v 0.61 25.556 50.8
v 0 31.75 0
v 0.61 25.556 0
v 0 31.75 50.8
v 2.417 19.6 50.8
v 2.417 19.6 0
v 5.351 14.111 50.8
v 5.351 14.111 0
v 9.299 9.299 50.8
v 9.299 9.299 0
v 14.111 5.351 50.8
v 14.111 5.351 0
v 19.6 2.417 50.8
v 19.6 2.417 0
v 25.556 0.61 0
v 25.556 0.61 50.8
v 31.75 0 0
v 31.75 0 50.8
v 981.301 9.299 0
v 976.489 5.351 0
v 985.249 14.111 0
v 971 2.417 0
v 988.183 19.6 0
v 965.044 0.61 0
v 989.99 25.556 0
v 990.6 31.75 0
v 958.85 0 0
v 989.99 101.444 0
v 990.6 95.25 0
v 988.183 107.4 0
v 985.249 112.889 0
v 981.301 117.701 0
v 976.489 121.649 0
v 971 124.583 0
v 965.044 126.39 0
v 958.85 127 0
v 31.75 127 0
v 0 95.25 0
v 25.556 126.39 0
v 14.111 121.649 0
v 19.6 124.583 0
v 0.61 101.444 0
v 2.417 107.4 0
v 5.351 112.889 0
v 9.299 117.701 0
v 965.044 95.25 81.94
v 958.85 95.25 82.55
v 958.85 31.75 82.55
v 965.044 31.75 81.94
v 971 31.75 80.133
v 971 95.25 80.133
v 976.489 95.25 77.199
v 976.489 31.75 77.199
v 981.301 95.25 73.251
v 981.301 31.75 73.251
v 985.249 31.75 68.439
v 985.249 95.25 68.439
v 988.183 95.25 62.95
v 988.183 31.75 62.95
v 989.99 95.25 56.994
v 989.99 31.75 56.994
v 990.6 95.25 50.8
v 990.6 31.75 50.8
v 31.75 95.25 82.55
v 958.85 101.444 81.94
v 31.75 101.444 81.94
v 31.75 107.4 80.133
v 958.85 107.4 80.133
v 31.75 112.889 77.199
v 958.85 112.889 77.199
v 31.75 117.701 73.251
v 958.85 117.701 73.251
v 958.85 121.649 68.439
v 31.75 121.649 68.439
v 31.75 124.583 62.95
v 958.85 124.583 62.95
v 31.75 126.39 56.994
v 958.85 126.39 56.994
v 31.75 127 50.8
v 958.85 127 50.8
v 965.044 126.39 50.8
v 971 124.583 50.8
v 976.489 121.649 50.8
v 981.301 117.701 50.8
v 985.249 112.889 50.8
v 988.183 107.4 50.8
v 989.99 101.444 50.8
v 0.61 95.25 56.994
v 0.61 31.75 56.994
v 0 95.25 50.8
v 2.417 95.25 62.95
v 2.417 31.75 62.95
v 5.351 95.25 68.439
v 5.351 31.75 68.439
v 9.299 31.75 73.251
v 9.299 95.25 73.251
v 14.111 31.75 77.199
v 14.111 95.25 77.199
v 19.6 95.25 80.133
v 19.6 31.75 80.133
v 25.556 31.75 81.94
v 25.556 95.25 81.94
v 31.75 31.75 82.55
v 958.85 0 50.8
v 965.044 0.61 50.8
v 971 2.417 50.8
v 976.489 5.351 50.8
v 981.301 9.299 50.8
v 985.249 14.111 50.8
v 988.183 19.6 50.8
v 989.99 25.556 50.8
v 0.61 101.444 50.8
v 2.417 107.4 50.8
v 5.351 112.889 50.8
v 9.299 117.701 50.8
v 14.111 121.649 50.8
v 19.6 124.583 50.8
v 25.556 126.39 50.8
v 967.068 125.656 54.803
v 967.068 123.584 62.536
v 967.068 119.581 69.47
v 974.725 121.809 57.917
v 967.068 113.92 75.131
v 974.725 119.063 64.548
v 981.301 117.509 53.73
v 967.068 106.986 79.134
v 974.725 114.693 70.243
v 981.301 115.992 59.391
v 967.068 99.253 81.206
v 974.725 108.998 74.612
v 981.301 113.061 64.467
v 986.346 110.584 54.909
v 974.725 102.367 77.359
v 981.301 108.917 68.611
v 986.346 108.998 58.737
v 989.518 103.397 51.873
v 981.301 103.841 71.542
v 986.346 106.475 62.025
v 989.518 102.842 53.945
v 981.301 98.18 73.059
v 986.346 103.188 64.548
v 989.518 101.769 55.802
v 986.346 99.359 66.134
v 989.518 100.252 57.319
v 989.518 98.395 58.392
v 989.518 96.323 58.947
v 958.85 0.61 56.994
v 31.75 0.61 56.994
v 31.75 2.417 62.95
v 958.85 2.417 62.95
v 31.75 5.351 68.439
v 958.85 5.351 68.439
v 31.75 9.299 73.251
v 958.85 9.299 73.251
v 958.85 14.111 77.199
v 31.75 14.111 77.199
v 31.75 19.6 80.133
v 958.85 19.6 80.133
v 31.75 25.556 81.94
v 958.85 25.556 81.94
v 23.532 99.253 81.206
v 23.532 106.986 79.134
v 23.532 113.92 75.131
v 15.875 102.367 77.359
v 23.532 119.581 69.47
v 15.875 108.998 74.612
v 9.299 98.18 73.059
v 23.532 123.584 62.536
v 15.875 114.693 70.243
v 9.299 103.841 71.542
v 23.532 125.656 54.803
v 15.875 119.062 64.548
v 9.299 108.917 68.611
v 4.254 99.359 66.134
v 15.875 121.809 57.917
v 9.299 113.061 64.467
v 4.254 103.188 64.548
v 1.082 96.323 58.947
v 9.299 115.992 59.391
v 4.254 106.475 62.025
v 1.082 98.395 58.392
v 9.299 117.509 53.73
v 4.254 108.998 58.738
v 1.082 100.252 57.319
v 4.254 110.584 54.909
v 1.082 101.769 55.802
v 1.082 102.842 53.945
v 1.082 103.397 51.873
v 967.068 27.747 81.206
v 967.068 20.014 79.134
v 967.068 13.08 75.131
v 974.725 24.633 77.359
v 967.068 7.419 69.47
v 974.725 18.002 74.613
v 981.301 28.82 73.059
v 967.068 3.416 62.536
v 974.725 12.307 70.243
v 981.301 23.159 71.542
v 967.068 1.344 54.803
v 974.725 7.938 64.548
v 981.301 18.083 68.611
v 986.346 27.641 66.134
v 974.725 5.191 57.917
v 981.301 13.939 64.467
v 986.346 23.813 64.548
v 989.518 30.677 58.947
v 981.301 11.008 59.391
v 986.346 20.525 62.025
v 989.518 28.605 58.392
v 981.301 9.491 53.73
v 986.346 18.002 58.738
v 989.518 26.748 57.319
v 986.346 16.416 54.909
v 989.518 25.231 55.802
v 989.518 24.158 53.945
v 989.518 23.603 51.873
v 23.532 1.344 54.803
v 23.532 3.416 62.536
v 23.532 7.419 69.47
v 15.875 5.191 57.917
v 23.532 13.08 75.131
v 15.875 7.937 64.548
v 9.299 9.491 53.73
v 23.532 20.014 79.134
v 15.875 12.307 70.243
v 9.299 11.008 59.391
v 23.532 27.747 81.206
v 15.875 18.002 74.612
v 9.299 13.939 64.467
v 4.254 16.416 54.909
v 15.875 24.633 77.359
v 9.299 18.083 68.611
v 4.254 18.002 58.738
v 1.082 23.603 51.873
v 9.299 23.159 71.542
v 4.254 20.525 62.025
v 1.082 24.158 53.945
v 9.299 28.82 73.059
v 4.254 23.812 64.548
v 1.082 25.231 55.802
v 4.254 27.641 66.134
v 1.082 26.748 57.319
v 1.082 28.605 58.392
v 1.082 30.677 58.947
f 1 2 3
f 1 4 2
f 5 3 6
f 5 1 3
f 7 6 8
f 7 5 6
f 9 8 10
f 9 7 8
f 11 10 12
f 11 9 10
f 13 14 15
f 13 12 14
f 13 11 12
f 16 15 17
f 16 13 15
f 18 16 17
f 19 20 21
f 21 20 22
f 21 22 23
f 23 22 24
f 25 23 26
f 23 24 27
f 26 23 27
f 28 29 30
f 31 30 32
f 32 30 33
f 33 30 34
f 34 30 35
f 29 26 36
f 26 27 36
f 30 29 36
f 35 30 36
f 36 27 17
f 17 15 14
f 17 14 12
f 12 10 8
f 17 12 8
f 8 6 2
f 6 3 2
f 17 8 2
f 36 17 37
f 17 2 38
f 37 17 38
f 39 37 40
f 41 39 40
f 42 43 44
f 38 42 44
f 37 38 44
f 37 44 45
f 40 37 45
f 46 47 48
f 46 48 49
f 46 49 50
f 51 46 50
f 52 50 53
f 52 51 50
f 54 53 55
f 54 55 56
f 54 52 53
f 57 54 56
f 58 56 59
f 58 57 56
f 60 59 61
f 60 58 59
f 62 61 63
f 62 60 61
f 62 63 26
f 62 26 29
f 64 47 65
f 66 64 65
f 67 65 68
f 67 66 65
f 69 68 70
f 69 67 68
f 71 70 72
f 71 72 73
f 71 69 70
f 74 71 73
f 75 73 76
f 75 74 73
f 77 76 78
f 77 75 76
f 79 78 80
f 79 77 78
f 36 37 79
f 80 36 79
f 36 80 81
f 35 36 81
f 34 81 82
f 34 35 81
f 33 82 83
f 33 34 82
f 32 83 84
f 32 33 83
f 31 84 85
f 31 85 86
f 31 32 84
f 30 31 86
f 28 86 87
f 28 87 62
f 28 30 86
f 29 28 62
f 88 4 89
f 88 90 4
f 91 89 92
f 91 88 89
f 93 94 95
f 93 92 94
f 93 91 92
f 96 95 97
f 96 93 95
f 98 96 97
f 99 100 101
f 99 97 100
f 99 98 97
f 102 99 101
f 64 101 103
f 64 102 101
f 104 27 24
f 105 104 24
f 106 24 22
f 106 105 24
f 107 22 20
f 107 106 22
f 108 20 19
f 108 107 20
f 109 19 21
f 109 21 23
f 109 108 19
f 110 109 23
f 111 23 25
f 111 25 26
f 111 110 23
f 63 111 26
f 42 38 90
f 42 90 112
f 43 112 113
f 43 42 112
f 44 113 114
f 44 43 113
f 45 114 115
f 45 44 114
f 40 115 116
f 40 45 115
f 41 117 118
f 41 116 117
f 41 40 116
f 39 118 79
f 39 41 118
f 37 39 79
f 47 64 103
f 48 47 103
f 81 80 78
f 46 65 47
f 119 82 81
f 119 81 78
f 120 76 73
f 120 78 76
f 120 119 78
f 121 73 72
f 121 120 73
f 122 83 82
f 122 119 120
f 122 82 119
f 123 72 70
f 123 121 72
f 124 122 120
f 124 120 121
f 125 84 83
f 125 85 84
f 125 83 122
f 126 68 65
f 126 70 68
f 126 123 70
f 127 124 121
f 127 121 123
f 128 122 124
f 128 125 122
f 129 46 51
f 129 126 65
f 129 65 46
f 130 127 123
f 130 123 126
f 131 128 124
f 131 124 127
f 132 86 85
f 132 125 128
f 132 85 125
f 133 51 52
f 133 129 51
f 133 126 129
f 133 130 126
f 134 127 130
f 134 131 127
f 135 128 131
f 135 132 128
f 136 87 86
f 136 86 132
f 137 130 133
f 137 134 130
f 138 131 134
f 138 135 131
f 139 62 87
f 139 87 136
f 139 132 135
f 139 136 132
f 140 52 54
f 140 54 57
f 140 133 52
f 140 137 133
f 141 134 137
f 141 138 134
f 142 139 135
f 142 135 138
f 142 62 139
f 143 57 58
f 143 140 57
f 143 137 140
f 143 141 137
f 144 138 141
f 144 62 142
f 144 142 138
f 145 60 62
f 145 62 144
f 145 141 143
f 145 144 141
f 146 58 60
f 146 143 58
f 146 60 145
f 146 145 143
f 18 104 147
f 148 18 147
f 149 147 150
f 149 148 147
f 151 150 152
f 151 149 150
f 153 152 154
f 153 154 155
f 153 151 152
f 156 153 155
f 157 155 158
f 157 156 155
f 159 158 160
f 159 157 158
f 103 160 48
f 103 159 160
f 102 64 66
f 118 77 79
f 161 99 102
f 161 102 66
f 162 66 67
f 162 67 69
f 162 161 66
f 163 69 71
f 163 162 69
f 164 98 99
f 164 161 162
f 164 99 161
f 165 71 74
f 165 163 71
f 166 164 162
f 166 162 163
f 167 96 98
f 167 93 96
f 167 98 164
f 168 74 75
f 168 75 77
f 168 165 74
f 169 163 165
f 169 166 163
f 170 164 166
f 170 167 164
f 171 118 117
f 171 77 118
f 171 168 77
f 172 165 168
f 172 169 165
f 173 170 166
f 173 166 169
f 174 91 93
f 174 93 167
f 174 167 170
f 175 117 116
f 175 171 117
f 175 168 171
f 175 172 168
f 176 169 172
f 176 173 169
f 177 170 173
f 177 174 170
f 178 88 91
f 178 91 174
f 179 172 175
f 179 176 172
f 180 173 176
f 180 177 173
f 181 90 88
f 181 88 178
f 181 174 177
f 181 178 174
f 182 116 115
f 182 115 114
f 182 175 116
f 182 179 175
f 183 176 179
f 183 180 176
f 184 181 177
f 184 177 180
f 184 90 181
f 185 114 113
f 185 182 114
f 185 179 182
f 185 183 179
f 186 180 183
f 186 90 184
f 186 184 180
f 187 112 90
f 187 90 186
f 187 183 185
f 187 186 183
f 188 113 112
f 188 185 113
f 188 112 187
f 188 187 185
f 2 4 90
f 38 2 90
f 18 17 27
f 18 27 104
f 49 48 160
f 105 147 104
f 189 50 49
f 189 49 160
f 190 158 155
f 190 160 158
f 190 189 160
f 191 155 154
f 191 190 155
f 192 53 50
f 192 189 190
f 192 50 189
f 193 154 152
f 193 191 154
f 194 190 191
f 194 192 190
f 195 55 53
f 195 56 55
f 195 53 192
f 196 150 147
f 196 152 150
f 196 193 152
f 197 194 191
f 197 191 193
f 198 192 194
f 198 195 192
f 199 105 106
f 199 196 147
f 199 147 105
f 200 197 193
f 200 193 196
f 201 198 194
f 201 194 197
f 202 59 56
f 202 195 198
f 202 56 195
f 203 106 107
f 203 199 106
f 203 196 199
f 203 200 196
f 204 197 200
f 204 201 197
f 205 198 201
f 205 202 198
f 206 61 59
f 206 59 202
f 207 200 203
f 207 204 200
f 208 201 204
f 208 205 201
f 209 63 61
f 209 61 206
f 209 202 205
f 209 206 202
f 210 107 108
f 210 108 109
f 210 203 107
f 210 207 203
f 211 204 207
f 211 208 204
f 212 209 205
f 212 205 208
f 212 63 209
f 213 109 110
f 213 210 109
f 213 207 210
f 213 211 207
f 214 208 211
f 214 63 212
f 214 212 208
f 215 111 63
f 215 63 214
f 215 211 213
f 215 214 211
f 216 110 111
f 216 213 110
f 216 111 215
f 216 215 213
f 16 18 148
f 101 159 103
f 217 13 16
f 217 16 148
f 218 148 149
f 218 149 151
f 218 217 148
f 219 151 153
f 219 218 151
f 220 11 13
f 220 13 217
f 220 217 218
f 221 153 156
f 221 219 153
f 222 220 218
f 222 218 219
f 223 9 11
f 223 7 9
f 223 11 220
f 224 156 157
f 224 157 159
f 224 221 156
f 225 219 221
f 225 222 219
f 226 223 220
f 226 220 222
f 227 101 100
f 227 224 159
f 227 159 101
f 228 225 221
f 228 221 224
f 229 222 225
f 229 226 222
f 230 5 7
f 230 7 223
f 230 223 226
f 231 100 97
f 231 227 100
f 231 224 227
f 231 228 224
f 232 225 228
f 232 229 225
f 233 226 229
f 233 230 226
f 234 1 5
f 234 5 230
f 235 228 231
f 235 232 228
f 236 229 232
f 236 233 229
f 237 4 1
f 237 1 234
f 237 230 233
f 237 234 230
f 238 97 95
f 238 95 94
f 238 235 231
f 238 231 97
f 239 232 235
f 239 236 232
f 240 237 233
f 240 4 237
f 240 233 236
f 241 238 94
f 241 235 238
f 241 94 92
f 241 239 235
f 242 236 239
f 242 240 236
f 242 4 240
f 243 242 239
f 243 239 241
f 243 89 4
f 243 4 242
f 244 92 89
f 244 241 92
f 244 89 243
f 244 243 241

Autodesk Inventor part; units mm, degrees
ref_plane "YZ Plane" through (0, 0, 0) normal (1, 0, 0) x (0, 1, 0)
ref_plane "XZ Plane" through (0, 0, 0) normal (0, 1, 0) x (-1, 0, 0)
ref_plane "XY Plane" through (0, 0, 0) normal (0, 0, 1) x (1, 0, 0)
sketch "Sketch1" plane through (0, 0, 0) normal (1, 0, 0) x (0, 1, 0)
  line L0 (0, 0) -> (127, 0)
  line L1 (127, 0) -> (127, 50.8)
  line L2 (0, 0) -> (0, 50.8)
  arc A0 (95.25, 82.55) -> (127, 50.8) centre (95.25, 50.8) ccw construction
  arc A1 (31.75, 82.55) -> (0, 50.8) centre (31.75, 50.8) ccw
  line L3 (95.25, 82.55) -> (31.75, 82.55)
  arc A2 (127, 50.8) -> (95.25, 82.55) centre (95.25, 50.8) ccw
  line L4 (127, 19.05) -> (0, 19.05) construction
  dimension "d0" = 127
  dimension "d1" = 63.5
  dimension "d2" = 19.05
extrude "Extrusion1" add sketch "Sketch1" along normal blind 990.6
fillet "Fillet1" radius 31.75 10 edges at (990.6, 0, 25.4) (990.6, 63.5, 82.55) (990.6, 117.7006, 73.2506) (990.6, 127, 25.4) (990.6, 9.2994, 73.2506) (0, 0, 25.4) (0, 63.5, 82.55) (0, 117.7006, 73.2506) (0, 127, 25.4) (0, 9.2994, 73.2506)
properties part number "Back Bumper"
